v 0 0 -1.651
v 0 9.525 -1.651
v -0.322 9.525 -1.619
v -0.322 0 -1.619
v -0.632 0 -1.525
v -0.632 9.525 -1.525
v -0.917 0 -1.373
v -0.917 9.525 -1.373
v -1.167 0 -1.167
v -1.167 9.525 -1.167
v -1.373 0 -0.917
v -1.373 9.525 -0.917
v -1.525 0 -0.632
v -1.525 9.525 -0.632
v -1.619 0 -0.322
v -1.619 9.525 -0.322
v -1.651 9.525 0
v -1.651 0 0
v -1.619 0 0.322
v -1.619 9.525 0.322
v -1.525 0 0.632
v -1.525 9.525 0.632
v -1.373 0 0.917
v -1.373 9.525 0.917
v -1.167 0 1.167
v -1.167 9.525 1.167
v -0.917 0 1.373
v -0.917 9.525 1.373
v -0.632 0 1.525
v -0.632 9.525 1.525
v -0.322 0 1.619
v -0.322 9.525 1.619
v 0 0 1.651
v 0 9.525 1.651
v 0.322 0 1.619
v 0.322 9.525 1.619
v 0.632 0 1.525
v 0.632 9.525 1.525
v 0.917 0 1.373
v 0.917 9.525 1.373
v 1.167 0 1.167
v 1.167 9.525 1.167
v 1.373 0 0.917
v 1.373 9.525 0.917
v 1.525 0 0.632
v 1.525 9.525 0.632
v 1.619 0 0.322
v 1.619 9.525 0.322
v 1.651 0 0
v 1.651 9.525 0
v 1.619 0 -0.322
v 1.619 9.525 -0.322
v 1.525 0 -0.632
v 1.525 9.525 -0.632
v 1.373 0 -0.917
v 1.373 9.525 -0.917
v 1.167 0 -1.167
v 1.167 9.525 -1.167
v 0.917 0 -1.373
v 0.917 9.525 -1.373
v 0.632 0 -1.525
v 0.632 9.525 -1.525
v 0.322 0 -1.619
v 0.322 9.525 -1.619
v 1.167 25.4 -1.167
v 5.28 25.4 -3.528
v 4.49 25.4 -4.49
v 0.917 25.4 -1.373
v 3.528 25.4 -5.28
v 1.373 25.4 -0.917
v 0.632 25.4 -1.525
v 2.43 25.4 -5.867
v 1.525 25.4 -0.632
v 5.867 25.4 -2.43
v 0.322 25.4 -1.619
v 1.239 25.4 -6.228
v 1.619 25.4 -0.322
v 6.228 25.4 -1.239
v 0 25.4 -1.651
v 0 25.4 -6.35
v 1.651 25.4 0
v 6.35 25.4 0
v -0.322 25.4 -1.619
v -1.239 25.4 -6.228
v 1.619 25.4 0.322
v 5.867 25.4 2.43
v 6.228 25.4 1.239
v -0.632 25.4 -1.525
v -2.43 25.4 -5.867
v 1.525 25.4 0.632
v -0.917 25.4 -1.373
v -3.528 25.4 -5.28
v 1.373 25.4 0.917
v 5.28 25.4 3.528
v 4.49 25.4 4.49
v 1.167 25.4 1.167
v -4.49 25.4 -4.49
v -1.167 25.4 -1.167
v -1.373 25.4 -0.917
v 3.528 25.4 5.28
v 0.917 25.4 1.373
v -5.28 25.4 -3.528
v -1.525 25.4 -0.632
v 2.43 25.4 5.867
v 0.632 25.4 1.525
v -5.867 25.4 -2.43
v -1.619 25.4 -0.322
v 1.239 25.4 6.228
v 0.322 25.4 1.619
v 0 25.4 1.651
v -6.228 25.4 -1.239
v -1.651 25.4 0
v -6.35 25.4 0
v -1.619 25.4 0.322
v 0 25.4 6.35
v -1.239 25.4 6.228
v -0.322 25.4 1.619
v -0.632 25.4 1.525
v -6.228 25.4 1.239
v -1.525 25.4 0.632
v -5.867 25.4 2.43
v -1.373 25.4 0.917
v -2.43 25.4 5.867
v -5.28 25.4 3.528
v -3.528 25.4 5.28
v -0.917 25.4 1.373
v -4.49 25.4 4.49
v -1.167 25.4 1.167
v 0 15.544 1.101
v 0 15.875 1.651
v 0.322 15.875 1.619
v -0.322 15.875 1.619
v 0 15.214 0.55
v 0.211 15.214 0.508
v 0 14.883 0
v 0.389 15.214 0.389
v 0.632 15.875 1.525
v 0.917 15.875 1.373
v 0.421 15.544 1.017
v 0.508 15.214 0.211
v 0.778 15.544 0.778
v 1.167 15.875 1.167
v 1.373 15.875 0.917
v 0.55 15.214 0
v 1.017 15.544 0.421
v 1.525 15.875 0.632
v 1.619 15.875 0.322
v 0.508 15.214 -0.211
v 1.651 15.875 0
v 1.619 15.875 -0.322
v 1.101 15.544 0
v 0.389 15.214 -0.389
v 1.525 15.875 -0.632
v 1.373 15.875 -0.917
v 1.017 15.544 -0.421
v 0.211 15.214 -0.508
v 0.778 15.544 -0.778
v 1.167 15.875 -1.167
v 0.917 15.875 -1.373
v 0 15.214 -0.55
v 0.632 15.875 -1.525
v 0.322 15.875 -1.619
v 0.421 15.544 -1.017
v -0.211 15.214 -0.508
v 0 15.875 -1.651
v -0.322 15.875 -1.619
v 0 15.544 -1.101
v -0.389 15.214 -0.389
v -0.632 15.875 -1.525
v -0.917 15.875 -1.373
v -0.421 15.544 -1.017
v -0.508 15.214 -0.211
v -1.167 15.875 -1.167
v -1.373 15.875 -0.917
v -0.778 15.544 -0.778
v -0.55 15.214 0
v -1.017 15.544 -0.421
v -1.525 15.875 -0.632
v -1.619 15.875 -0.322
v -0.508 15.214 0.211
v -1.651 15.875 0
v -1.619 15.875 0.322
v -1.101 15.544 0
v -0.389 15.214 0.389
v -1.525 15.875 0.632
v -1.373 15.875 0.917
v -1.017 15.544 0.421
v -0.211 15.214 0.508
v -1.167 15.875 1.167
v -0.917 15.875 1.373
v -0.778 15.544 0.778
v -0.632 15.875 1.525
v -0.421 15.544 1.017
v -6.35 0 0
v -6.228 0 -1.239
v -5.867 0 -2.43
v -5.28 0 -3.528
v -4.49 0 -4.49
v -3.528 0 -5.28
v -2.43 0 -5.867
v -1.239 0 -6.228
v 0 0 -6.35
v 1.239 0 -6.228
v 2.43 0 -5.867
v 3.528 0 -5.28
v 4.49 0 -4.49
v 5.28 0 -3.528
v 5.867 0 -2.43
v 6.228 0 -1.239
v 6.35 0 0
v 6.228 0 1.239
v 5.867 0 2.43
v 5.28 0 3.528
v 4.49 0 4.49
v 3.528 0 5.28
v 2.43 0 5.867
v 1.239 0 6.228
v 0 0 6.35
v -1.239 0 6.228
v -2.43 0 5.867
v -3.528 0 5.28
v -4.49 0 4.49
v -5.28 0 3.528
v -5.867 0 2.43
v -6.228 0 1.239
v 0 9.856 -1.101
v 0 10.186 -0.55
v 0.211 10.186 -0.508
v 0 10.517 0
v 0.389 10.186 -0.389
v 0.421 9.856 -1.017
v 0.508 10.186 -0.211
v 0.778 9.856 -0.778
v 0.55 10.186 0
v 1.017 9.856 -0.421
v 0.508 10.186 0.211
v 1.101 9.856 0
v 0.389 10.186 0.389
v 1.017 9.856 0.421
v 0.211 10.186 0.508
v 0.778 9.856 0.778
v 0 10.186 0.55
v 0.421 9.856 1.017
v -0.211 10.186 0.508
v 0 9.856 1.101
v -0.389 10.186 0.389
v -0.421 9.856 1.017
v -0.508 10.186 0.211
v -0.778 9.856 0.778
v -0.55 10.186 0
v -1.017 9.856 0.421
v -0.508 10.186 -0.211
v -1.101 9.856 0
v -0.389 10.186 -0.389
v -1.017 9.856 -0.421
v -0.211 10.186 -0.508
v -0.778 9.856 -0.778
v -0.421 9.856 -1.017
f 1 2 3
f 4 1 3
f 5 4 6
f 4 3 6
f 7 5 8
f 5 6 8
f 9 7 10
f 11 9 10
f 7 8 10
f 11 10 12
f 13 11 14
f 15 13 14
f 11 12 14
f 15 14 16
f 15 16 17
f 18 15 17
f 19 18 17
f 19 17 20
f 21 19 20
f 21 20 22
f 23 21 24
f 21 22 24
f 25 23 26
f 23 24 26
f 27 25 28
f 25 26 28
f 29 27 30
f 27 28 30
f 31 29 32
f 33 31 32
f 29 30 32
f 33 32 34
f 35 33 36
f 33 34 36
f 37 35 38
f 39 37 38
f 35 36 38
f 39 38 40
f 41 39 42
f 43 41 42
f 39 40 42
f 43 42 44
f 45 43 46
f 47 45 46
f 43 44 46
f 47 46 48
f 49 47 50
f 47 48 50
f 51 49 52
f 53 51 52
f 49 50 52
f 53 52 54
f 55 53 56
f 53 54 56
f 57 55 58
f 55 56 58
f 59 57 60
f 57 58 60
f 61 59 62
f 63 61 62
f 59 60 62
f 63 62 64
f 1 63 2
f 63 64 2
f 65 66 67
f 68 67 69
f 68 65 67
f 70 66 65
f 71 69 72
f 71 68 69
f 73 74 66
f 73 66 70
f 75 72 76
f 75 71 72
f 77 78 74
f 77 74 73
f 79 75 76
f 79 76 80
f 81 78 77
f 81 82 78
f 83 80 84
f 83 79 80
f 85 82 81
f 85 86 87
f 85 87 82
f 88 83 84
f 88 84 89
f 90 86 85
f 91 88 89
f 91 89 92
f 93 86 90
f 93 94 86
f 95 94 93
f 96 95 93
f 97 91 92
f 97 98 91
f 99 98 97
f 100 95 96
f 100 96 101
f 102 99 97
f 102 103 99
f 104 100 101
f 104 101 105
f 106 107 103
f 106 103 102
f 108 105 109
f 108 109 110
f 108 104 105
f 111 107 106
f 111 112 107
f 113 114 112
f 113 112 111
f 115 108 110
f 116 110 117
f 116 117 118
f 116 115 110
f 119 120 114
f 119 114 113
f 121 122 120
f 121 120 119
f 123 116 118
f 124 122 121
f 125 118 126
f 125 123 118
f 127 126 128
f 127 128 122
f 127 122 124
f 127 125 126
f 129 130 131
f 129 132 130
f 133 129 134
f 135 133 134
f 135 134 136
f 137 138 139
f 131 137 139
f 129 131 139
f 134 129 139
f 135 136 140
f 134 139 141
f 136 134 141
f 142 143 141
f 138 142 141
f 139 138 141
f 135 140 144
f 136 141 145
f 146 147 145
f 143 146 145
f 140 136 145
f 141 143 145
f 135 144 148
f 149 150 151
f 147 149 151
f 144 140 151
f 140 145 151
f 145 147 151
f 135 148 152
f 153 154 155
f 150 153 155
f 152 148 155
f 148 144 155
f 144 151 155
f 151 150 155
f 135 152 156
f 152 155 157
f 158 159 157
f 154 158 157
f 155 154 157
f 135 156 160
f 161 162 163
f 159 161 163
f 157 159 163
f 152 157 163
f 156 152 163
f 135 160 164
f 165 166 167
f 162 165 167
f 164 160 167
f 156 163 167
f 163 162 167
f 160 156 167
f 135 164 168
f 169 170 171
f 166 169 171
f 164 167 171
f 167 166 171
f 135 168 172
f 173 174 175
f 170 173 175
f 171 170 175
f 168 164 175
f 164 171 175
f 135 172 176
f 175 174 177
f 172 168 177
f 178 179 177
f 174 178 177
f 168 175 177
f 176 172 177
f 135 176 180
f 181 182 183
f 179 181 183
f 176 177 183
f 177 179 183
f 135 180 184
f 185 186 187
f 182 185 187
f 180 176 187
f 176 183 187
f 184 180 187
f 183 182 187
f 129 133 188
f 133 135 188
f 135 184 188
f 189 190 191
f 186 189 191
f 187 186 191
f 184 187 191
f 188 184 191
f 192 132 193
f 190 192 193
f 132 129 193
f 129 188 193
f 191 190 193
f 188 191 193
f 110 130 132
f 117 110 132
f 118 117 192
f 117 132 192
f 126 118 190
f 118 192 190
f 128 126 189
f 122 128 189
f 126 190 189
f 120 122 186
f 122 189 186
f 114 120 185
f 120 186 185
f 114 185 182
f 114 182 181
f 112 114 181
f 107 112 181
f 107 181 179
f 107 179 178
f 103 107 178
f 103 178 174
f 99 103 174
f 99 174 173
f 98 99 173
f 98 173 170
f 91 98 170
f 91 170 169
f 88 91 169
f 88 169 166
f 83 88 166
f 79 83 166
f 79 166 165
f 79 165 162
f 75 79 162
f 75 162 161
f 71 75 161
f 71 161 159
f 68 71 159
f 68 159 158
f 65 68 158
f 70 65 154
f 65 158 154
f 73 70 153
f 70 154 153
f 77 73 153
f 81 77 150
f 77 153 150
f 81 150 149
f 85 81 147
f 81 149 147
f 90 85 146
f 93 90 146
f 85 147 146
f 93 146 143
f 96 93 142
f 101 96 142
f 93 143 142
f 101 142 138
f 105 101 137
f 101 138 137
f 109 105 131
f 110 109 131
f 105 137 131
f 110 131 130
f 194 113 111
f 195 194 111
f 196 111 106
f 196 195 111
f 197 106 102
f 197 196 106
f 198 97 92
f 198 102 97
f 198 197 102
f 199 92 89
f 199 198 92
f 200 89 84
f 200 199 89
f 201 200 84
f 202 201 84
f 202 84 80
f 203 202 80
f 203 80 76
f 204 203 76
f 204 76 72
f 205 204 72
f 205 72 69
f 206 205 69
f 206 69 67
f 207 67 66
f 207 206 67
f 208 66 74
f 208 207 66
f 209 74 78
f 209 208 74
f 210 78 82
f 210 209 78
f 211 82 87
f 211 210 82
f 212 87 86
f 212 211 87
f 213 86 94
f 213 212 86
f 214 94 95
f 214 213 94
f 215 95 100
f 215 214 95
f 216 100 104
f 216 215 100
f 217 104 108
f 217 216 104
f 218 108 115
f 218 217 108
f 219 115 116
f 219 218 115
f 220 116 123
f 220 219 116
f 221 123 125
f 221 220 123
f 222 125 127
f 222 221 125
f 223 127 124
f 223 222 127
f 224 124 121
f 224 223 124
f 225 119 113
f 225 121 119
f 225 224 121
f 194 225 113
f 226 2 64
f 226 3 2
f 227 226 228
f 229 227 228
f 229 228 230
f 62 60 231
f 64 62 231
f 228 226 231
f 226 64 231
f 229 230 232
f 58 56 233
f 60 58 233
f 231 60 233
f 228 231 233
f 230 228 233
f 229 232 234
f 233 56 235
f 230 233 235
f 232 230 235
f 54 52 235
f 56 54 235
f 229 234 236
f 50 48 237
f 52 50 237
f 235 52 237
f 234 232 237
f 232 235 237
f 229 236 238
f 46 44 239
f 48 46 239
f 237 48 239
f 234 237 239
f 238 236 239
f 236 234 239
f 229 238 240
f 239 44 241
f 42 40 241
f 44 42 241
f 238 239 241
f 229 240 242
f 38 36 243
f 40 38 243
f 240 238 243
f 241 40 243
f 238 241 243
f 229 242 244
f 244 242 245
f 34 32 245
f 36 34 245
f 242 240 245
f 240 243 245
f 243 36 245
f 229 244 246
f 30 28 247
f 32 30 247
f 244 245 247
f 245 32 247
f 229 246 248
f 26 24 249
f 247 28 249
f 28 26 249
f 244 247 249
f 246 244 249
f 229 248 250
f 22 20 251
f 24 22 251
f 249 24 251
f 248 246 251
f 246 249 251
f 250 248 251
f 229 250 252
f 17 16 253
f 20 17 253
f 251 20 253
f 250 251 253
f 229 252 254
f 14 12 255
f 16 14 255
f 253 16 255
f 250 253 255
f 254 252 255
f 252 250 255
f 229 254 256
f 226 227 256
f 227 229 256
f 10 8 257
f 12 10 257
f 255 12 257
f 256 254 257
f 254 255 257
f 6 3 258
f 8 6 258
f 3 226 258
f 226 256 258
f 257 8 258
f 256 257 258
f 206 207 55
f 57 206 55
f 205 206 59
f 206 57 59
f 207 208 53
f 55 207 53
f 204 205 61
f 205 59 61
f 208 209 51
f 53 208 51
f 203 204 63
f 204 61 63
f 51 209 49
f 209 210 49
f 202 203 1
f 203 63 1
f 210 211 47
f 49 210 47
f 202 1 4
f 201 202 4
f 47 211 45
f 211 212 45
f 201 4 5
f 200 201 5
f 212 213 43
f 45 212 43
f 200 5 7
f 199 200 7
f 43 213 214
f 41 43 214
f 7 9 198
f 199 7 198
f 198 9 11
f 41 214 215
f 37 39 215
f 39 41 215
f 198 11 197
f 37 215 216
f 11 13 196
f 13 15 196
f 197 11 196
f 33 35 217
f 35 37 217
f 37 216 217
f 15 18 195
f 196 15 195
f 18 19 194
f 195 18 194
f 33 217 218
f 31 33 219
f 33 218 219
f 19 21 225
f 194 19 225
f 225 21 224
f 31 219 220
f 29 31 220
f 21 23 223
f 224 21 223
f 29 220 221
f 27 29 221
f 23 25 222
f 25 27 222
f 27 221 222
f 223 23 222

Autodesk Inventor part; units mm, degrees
ref_plane "YZ Plane" through (0, 0, 0) normal (1, 0, 0) x (0, 1, 0)
ref_plane "XZ Plane" through (0, 0, 0) normal (0, 1, 0) x (-1, 0, 0)
ref_plane "XY Plane" through (0, 0, 0) normal (0, 0, 1) x (1, 0, 0)
sketch "Sketch1" plane through (0, 0, 0) normal (0, 1, 0) x (-1, 0, 0)
  circle A0 centre (0, 0) radius 6.35
  dimension "d0" = 12.7
extrude "Extrusion1" add sketch "Sketch1" along normal blind 25.4
hole "Hole1" at (0, 25.4, 0) direction (0, -1, 0) diameter 3.302 depth 9.525 tip angle 118 thread size "8-32 UNC" class "2B" standard "ANSI Unified Screw Threads"
hole "Hole2" at (0, 0, 0) direction (0, 1, 0) diameter 3.302 depth 9.525 tip angle 118 thread size "8-32 UNC" class "2B" standard "ANSI Unified Screw Threads"
properties part number "alumina_standoff_LSP_ASO00110"
